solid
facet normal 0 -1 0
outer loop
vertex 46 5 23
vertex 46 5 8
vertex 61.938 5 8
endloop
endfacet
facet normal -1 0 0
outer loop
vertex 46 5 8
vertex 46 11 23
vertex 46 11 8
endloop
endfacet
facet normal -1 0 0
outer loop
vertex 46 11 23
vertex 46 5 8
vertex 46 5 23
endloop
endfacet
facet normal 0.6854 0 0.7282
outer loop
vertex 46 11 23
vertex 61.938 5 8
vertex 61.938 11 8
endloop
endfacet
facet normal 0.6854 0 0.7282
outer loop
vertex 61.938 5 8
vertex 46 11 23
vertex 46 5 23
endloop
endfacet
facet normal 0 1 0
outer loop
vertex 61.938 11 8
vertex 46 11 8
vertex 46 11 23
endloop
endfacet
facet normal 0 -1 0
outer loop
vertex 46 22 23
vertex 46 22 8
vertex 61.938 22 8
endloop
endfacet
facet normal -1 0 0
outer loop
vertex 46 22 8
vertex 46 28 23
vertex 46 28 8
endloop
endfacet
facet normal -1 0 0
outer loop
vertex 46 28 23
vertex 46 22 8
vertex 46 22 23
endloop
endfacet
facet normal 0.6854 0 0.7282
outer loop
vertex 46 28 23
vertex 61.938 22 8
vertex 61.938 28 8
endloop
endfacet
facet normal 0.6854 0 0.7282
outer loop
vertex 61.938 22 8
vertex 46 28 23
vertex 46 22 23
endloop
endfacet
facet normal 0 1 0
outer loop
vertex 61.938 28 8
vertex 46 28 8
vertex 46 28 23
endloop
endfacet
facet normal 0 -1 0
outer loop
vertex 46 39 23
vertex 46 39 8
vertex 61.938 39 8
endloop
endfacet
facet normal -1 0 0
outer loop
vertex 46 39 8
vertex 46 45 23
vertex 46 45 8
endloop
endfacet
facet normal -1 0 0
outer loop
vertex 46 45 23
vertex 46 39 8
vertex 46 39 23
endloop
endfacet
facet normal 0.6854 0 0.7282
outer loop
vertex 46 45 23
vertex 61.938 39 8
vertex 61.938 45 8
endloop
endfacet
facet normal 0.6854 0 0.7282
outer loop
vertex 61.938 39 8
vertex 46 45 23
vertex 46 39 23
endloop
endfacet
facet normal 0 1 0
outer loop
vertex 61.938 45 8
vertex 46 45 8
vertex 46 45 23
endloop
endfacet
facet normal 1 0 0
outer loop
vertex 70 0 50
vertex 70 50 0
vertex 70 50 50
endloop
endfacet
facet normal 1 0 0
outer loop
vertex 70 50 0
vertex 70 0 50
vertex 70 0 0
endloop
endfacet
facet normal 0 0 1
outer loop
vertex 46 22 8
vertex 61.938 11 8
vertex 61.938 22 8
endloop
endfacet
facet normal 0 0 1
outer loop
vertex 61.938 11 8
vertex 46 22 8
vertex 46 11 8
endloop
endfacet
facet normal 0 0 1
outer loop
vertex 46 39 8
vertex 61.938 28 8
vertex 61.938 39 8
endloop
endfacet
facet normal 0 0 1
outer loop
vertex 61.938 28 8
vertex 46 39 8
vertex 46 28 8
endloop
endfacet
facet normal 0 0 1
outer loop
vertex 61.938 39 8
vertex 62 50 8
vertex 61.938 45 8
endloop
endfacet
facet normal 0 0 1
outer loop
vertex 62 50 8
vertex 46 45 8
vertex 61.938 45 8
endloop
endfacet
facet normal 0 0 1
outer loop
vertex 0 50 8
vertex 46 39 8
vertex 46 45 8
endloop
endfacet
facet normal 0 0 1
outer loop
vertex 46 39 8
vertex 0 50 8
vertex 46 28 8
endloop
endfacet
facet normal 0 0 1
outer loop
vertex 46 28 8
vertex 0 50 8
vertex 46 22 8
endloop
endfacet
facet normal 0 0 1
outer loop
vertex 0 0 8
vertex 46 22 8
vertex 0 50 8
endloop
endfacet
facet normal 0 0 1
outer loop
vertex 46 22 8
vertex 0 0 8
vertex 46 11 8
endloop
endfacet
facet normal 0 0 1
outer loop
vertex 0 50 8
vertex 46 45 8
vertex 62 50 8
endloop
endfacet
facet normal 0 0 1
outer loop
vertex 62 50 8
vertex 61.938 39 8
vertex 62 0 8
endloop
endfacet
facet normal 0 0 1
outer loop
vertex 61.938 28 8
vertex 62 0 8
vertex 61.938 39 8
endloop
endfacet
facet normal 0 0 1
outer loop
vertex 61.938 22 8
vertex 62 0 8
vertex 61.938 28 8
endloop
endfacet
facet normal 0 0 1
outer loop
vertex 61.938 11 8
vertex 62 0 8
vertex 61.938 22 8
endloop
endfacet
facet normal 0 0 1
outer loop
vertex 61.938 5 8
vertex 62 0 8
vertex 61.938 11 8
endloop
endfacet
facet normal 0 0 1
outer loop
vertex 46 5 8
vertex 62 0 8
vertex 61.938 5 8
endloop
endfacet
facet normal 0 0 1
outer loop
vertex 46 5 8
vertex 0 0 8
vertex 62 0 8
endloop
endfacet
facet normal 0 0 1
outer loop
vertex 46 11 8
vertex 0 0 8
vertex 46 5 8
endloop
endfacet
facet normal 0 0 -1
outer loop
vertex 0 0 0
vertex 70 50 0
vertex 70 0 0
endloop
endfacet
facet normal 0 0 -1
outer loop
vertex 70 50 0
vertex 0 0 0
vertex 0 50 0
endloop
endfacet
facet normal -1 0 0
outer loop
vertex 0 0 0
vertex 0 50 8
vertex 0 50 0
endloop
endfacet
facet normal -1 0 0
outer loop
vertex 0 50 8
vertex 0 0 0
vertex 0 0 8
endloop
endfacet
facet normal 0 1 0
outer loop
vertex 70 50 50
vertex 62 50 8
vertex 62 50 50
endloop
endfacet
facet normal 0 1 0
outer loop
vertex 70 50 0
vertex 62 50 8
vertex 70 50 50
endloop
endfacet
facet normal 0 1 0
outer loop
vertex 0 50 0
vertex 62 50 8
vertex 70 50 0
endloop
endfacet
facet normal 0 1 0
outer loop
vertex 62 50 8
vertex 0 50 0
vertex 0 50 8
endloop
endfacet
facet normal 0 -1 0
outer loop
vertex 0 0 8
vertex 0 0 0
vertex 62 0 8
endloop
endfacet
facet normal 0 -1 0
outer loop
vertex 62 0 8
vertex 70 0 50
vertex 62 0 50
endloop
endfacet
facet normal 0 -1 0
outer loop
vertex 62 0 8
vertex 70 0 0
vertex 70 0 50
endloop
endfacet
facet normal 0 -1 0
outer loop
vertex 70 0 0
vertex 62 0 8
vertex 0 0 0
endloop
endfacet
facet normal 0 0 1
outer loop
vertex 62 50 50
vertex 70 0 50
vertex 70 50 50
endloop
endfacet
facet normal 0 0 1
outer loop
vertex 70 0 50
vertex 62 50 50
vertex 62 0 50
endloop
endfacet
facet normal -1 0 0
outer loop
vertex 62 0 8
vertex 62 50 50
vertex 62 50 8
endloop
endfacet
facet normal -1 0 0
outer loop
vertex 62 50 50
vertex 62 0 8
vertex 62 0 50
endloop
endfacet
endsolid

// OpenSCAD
$fn = 32;

// ----------------------------------------------------------------------
// Rib bracket: 3-gusset L bracket
// ----------------------------------------------------------------------

// --- parameters (mm) ---
base_l = 70;              // foot length, X
base_w = 50;              // foot width, Y
base_t = 8;               // foot thickness
plate_t = 8;              // upright plate thickness
plate_h = 50;             // overall height
gus_l = 16;               // gusset leg along the foot
gus_h = 16;               // gusset height
gus_t = 6;                // gusset thickness
gus_edge = 5;             // gusset margin from the foot edge
n_gus = 3;                // gusset count

gus_pitch = (base_w - 2 * gus_edge - gus_t) / (n_gus - 1);  // gusset pitch

union() {
  cube([base_l, base_w, base_t]);
  translate([base_l - plate_t, 0, base_t - 1])
    cube([plate_t, base_w, plate_h - base_t + 1]);
  for (i = [0 : n_gus - 1])
    translate([base_l - plate_t - gus_l, gus_edge + i * gus_pitch, base_t - 1])
      rotate([-90, 0, 0])
        linear_extrude(height = gus_t)
          polygon(points = [[0, 0], [gus_l + 1, 0], [0, -gus_h]]);
}
